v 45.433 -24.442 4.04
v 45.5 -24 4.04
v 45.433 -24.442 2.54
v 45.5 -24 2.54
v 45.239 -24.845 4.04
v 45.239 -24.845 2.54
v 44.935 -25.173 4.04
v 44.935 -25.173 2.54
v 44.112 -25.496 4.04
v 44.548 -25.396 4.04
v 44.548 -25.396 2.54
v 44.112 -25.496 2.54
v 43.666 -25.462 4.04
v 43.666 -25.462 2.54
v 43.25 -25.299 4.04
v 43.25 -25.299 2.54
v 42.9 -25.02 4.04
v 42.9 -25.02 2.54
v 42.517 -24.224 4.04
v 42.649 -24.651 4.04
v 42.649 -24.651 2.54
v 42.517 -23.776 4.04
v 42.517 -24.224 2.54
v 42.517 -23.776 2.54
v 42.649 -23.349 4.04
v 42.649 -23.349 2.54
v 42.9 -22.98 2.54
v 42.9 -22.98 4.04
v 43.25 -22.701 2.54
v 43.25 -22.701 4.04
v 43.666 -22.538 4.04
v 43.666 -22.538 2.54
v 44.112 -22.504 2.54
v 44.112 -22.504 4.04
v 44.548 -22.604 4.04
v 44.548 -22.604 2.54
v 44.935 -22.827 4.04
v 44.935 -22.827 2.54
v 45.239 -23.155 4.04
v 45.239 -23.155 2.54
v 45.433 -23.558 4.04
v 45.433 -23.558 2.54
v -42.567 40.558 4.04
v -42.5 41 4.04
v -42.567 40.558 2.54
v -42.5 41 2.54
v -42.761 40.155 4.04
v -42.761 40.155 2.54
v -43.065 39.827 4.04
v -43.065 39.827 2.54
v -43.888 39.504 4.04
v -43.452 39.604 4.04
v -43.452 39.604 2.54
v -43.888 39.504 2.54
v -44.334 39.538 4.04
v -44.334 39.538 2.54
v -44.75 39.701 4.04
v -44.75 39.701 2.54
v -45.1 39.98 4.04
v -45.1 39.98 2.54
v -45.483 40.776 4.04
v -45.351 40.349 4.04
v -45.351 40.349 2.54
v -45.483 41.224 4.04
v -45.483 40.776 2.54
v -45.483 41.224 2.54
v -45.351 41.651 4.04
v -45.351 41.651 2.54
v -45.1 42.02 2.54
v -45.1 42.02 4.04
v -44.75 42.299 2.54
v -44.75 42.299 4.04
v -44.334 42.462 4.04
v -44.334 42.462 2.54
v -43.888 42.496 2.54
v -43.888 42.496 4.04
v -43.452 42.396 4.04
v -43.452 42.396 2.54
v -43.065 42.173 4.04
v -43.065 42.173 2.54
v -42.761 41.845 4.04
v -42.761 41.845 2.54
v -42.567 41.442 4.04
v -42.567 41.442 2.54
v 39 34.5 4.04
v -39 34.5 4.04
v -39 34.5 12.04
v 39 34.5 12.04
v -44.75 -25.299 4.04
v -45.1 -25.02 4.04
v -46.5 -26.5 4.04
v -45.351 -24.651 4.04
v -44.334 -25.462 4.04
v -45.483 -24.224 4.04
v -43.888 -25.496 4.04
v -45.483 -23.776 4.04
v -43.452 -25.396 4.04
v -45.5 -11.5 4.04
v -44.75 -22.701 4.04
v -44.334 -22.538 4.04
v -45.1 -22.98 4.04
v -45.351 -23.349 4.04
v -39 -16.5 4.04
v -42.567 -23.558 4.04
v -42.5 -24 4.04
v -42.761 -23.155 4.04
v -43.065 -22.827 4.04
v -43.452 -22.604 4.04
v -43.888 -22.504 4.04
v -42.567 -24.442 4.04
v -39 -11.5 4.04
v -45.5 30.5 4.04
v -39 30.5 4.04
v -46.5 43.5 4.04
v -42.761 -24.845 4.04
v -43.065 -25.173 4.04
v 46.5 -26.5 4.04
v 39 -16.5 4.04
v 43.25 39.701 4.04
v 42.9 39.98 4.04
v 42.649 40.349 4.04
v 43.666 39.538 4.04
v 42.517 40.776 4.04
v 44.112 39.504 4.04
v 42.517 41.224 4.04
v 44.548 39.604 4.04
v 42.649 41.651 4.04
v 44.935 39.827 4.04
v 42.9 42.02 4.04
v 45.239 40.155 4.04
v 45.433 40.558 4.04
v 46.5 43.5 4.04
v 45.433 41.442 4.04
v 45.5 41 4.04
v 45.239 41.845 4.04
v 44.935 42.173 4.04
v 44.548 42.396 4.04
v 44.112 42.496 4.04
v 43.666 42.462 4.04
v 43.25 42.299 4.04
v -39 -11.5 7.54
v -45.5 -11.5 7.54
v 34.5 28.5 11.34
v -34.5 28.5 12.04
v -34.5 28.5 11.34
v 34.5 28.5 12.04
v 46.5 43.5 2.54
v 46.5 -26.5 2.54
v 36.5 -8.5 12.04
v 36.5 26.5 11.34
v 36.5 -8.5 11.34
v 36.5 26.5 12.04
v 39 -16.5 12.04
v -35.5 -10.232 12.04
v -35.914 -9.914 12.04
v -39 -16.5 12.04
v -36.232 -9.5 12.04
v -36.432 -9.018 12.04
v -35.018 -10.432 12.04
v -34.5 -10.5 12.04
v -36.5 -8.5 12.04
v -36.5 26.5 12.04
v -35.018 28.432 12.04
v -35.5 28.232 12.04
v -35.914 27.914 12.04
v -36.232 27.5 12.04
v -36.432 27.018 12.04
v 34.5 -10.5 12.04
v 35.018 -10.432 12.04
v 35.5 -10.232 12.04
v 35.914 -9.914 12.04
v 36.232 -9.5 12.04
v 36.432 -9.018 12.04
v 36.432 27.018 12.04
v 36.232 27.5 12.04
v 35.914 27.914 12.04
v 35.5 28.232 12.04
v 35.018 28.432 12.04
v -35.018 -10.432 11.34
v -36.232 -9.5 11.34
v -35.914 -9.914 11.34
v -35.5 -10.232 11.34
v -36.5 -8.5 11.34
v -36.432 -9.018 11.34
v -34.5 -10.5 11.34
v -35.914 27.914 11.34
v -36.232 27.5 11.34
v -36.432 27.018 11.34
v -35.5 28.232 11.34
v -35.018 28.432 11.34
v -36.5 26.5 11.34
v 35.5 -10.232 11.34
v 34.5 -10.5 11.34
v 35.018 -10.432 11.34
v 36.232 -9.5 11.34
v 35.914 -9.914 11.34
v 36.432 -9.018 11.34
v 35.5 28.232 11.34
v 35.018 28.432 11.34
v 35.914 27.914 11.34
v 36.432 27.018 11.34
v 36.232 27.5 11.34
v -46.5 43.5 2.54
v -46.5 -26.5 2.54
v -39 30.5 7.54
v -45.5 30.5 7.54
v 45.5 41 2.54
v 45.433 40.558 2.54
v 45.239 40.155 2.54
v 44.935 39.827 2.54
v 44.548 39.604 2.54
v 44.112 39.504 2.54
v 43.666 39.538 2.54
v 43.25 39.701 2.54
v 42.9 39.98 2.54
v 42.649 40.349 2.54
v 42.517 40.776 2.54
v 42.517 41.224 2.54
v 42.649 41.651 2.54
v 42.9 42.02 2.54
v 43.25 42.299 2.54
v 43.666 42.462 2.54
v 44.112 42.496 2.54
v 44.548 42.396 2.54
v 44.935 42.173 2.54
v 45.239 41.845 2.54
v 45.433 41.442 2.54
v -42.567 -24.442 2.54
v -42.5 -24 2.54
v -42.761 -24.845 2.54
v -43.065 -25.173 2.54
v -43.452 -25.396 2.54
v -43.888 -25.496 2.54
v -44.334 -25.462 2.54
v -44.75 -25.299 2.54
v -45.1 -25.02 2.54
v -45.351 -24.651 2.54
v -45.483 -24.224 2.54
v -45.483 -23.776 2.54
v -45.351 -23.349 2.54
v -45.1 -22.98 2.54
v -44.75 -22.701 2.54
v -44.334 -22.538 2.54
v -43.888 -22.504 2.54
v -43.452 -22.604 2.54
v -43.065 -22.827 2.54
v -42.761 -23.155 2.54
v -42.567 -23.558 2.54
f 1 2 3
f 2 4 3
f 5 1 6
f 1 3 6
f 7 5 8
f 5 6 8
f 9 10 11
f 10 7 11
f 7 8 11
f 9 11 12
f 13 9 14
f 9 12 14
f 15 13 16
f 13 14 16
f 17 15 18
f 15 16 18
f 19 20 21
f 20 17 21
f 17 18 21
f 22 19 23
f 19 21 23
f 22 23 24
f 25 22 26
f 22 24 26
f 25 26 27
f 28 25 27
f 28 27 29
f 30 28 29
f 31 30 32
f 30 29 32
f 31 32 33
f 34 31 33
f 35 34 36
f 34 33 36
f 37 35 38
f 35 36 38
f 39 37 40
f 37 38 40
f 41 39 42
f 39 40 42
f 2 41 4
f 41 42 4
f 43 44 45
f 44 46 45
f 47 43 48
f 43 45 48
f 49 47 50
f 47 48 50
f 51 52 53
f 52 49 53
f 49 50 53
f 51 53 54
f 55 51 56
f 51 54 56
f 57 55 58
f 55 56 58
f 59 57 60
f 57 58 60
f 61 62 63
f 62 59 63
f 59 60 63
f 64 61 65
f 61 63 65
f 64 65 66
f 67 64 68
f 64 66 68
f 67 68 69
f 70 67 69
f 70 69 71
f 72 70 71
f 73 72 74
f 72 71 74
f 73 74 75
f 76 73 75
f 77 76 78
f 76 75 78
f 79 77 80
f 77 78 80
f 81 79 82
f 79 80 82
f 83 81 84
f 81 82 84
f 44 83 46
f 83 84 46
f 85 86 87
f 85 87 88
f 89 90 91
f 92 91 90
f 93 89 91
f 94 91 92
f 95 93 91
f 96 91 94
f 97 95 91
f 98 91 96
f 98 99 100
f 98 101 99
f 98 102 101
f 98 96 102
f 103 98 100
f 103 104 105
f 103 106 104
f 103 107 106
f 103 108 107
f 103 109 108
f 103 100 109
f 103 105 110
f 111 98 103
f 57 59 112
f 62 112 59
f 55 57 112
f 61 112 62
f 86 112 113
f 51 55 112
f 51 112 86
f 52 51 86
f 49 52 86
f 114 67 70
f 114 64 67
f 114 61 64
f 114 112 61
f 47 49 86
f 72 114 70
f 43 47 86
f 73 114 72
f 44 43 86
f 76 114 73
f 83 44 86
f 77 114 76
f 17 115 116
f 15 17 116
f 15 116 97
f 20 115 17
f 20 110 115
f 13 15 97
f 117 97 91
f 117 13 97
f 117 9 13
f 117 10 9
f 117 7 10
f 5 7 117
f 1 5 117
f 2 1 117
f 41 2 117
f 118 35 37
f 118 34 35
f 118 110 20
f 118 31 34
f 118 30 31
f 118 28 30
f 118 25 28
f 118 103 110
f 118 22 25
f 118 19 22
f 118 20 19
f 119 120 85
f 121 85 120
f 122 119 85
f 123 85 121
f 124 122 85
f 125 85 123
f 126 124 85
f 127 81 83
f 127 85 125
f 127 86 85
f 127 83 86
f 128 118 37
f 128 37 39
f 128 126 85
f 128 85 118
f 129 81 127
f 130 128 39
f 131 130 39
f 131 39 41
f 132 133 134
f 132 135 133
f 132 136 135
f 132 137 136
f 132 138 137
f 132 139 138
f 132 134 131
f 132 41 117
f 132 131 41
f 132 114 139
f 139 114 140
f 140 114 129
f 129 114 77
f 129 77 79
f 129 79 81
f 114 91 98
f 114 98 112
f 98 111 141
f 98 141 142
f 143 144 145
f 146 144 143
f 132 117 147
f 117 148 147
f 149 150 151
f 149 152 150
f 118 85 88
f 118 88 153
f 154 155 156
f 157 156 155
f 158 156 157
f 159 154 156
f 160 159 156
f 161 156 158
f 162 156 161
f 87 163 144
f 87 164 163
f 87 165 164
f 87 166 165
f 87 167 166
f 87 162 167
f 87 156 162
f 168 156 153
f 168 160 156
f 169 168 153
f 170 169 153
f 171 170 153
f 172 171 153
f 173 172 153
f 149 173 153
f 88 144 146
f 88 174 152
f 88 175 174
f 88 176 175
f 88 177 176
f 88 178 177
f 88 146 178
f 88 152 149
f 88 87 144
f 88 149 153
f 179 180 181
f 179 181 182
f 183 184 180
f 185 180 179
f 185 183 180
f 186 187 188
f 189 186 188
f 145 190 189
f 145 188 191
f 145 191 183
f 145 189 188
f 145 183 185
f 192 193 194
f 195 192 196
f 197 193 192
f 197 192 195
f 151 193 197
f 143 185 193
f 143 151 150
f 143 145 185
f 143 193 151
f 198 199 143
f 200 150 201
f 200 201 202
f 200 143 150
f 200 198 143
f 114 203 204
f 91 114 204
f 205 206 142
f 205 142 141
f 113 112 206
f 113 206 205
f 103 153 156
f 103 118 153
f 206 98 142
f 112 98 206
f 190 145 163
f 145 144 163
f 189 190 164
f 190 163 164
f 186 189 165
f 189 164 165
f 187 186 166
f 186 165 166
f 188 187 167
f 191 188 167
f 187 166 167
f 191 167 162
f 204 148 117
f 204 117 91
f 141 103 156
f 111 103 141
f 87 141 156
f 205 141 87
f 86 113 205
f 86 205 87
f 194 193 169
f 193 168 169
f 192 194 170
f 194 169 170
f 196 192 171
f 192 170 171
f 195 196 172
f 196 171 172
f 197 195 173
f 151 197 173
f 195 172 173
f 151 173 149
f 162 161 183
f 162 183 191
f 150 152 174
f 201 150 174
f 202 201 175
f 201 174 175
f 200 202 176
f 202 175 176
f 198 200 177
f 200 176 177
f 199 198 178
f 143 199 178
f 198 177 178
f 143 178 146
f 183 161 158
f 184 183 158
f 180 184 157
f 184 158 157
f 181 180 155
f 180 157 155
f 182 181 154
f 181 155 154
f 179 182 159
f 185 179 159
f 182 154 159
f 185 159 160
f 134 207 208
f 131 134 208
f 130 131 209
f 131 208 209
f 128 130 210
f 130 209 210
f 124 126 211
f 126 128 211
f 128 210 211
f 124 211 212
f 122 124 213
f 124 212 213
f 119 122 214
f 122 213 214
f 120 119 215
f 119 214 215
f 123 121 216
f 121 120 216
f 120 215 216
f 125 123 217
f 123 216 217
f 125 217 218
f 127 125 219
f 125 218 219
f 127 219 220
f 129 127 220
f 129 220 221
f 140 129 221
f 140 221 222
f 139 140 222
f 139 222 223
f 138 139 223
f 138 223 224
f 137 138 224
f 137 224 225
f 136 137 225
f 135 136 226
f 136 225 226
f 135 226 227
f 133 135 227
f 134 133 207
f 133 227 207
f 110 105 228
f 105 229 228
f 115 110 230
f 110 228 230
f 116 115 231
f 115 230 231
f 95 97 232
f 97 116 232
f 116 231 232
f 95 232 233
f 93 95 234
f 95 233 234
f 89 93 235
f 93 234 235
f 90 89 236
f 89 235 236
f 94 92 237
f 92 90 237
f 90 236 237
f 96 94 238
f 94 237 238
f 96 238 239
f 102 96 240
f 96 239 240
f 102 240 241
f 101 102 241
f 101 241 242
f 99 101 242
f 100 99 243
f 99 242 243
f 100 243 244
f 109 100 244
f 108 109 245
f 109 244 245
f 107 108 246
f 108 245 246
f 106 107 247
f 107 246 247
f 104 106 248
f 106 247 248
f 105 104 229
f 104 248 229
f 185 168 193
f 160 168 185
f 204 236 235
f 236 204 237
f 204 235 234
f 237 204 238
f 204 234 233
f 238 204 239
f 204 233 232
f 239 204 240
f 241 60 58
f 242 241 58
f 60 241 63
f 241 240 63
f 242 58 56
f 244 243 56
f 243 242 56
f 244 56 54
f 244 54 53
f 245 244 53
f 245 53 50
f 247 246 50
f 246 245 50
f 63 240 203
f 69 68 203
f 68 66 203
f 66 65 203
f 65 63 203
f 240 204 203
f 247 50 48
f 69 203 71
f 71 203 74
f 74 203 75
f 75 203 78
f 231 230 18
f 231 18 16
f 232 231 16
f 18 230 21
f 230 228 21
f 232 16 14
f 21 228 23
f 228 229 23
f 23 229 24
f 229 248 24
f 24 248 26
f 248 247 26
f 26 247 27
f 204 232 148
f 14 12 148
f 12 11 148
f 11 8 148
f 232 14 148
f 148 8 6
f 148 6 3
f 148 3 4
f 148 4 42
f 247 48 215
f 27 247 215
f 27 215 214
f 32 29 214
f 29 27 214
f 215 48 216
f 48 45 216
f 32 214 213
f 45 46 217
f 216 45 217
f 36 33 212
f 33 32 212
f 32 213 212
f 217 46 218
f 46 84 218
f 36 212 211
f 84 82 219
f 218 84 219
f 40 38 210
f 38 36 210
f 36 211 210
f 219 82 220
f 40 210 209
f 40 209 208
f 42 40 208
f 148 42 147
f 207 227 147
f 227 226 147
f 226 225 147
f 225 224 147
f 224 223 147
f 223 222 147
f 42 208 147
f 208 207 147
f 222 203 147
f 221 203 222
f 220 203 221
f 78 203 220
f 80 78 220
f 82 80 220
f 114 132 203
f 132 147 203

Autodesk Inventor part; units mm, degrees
ref_plane "YZ Plane" through (0, 0, 0) normal (1, 0, 0) x (0, 1, 0)
ref_plane "XZ Plane" through (0, 0, 0) normal (0, 1, 0) x (-1, 0, 0)
ref_plane "Work Plane1" through (0, 0, 2.54) normal (0, 0, 1) x (1, 0, 0)
sketch "Sketch2" plane through (0, 0, 2.54) normal (0, 0, 1) x (1, 0, 0)
  line L0 (6.5, -32.5) -> (6.5, -38.5) projected
  line L1 (6.5, -38.5) -> (0.5, -38.5) projected
  line L2 (0.5, -38.5) -> (0.5, -32.5) projected
  line L3 (0.5, -32.5) -> (6.5, -32.5) projected
  circle A0 centre (19.75, -34.75) radius 5.75 projected
  line L4 (43.5, -29) -> (43.5, -41.5) projected
  line L5 (43.5, -41.5) -> (30, -41.5) projected
  line L6 (30, -41.5) -> (30, -29) projected
  line L7 (30, -29) -> (43.5, -29) projected
  circle A1 centre (44, 41) radius 1.5 projected
  circle A2 centre (-44, 41) radius 1.5 projected
  line L8 (46.5, 43.5) -> (-46.5, 43.5) projected
  line L9 (-46.5, 43.5) -> (-46.5, -43.5) projected
  line L10 (-46.5, -43.5) -> (46.5, -43.5) projected
  line L11 (46.5, -43.5) -> (46.5, 43.5) projected
  line L12 (-46.5, 43.5) -> (46.5, 43.5)
  line L13 (46.5, 43.5) -> (46.5, -26.5)
  line L14 (46.5, -26.5) -> (-46.5, -26.5)
  line L15 (-46.5, -26.5) -> (-46.5, 43.5)
  circle A3 centre (-44, 41) radius 1.5
  circle A4 centre (44, 41) radius 1.5
  circle A5 centre (44, -24) radius 1.5
  circle A6 centre (-44, -24) radius 1.5
  line L16 (-45.5, -20.479) -> (-45.5, -25.5) construction
  line L17 (-45.5, -25.5) -> (-36.292, -25.5) construction
  line L18 (45.5, -16.7483) -> (45.5, -25.5) construction
  line L19 (45.5, -25.5) -> (38.0013, -25.5) construction
  circle A7 centre (-44, -24) radius 1.5 projected
  circle A8 centre (44, -24) radius 1.5 projected
  point P0 (0, 0)
  dimension "d0" = 70
  dimension "d1" = 3
  dimension "d2" = 3
  dimension "d3" = 1
  dimension "d4" = 1
  dimension "d5" = 1
  dimension "d6" = 1
  dimension "d21" = 65
  dimension "d22" = 65
extrude "Tykkelsen Grøn PCB" add sketch "Sketch2" along normal blind 1.5 contours L11 L14 L9 L8
sketch "Sketch3" plane through (0, 0, 4.04) normal (0, 0, 1) x (1, 0, 0)
  line L0 (-46.5, 43.5) -> (-46.5, -26.5) projected
  line L1 (46.5, -26.5) -> (46.5, 43.5) projected
  line L2 (46.5, 43.5) -> (-46.5, 43.5) projected
  line L3 (-39, 34.5) -> (39, 34.5)
  line L4 (39, 34.5) -> (39, -16.5)
  line L5 (39, -16.5) -> (-39, -16.5)
  line L6 (-39, -16.5) -> (-39, 34.5)
  point P0 (0, 0)
  dimension "d9" = 51
  dimension "d10" = 78
  dimension "d11" = 7.5
  dimension "d12" = 7.5
  dimension "d13" = 9
extrude "Skærm" add sketch "Sketch3" along normal blind 8
sketch "Sketch5" plane through (0, 0, 12.04) normal (0, 0, 1) x (1, 0, 0)
  line L0 (39, 34.5) -> (-39, 34.5) projected
  line L1 (-39, 34.5) -> (-39, -16.5) projected
  line L2 (-39, -16.5) -> (39, -16.5) projected
  line L3 (39, -16.5) -> (39, 34.5) projected
  line L4 (-34.5, 28.5) -> (34.5, 28.5)
  line L5 (36.5, 26.5) -> (36.5, -8.5)
  line L6 (34.5, -10.5) -> (-34.5, -10.5)
  line L7 (-36.5, -8.5) -> (-36.5, 26.5)
  arc A0 (-34.5, 28.5) -> (-36.5, 26.5) centre (-34.5, 26.5) ccw
  arc A1 (36.5, 26.5) -> (34.5, 28.5) centre (34.5, 26.5) ccw
  arc A2 (34.5, -10.5) -> (36.5, -8.5) centre (34.5, -8.5) ccw
  arc A3 (-36.5, -8.5) -> (-34.5, -10.5) centre (-34.5, -8.5) ccw
  point P0 (0, 0)
  dimension "d23" = 2.5
  dimension "d24" = 6
  dimension "d25" = 2.5
  dimension "d26" = 6
  dimension "d27" = 2
extrude "Hul ned i skærm" cut sketch "Sketch5" against normal blind 0.7 contours L4 A1 L5 A2 L6 A3 L7 A0
sketch "Sketch4" plane through (0, 0, 4.04) normal (0, 0, 1) x (1, 0, 0)
  line L0 (-39, -16.5) -> (-39, 34.5) projected
  line L1 (-39, 34.5) -> (39, 34.5) projected
  line L2 (-45.5, 30.5) -> (-39, 30.5)
  line L3 (-39, 30.5) -> (-39, -11.5)
  line L4 (-39, -11.5) -> (-45.5, -11.5)
  line L5 (-45.5, -11.5) -> (-45.5, 30.5)
  point P0 (0, 0)
  dimension "d16" = 42
  dimension "d17" = 6.5
  dimension "d18" = 4
extrude "Hvid ting" add sketch "Sketch4" along normal blind 3.5
equation "\"d11\" = d12"
properties part number "Grøn PCB"
